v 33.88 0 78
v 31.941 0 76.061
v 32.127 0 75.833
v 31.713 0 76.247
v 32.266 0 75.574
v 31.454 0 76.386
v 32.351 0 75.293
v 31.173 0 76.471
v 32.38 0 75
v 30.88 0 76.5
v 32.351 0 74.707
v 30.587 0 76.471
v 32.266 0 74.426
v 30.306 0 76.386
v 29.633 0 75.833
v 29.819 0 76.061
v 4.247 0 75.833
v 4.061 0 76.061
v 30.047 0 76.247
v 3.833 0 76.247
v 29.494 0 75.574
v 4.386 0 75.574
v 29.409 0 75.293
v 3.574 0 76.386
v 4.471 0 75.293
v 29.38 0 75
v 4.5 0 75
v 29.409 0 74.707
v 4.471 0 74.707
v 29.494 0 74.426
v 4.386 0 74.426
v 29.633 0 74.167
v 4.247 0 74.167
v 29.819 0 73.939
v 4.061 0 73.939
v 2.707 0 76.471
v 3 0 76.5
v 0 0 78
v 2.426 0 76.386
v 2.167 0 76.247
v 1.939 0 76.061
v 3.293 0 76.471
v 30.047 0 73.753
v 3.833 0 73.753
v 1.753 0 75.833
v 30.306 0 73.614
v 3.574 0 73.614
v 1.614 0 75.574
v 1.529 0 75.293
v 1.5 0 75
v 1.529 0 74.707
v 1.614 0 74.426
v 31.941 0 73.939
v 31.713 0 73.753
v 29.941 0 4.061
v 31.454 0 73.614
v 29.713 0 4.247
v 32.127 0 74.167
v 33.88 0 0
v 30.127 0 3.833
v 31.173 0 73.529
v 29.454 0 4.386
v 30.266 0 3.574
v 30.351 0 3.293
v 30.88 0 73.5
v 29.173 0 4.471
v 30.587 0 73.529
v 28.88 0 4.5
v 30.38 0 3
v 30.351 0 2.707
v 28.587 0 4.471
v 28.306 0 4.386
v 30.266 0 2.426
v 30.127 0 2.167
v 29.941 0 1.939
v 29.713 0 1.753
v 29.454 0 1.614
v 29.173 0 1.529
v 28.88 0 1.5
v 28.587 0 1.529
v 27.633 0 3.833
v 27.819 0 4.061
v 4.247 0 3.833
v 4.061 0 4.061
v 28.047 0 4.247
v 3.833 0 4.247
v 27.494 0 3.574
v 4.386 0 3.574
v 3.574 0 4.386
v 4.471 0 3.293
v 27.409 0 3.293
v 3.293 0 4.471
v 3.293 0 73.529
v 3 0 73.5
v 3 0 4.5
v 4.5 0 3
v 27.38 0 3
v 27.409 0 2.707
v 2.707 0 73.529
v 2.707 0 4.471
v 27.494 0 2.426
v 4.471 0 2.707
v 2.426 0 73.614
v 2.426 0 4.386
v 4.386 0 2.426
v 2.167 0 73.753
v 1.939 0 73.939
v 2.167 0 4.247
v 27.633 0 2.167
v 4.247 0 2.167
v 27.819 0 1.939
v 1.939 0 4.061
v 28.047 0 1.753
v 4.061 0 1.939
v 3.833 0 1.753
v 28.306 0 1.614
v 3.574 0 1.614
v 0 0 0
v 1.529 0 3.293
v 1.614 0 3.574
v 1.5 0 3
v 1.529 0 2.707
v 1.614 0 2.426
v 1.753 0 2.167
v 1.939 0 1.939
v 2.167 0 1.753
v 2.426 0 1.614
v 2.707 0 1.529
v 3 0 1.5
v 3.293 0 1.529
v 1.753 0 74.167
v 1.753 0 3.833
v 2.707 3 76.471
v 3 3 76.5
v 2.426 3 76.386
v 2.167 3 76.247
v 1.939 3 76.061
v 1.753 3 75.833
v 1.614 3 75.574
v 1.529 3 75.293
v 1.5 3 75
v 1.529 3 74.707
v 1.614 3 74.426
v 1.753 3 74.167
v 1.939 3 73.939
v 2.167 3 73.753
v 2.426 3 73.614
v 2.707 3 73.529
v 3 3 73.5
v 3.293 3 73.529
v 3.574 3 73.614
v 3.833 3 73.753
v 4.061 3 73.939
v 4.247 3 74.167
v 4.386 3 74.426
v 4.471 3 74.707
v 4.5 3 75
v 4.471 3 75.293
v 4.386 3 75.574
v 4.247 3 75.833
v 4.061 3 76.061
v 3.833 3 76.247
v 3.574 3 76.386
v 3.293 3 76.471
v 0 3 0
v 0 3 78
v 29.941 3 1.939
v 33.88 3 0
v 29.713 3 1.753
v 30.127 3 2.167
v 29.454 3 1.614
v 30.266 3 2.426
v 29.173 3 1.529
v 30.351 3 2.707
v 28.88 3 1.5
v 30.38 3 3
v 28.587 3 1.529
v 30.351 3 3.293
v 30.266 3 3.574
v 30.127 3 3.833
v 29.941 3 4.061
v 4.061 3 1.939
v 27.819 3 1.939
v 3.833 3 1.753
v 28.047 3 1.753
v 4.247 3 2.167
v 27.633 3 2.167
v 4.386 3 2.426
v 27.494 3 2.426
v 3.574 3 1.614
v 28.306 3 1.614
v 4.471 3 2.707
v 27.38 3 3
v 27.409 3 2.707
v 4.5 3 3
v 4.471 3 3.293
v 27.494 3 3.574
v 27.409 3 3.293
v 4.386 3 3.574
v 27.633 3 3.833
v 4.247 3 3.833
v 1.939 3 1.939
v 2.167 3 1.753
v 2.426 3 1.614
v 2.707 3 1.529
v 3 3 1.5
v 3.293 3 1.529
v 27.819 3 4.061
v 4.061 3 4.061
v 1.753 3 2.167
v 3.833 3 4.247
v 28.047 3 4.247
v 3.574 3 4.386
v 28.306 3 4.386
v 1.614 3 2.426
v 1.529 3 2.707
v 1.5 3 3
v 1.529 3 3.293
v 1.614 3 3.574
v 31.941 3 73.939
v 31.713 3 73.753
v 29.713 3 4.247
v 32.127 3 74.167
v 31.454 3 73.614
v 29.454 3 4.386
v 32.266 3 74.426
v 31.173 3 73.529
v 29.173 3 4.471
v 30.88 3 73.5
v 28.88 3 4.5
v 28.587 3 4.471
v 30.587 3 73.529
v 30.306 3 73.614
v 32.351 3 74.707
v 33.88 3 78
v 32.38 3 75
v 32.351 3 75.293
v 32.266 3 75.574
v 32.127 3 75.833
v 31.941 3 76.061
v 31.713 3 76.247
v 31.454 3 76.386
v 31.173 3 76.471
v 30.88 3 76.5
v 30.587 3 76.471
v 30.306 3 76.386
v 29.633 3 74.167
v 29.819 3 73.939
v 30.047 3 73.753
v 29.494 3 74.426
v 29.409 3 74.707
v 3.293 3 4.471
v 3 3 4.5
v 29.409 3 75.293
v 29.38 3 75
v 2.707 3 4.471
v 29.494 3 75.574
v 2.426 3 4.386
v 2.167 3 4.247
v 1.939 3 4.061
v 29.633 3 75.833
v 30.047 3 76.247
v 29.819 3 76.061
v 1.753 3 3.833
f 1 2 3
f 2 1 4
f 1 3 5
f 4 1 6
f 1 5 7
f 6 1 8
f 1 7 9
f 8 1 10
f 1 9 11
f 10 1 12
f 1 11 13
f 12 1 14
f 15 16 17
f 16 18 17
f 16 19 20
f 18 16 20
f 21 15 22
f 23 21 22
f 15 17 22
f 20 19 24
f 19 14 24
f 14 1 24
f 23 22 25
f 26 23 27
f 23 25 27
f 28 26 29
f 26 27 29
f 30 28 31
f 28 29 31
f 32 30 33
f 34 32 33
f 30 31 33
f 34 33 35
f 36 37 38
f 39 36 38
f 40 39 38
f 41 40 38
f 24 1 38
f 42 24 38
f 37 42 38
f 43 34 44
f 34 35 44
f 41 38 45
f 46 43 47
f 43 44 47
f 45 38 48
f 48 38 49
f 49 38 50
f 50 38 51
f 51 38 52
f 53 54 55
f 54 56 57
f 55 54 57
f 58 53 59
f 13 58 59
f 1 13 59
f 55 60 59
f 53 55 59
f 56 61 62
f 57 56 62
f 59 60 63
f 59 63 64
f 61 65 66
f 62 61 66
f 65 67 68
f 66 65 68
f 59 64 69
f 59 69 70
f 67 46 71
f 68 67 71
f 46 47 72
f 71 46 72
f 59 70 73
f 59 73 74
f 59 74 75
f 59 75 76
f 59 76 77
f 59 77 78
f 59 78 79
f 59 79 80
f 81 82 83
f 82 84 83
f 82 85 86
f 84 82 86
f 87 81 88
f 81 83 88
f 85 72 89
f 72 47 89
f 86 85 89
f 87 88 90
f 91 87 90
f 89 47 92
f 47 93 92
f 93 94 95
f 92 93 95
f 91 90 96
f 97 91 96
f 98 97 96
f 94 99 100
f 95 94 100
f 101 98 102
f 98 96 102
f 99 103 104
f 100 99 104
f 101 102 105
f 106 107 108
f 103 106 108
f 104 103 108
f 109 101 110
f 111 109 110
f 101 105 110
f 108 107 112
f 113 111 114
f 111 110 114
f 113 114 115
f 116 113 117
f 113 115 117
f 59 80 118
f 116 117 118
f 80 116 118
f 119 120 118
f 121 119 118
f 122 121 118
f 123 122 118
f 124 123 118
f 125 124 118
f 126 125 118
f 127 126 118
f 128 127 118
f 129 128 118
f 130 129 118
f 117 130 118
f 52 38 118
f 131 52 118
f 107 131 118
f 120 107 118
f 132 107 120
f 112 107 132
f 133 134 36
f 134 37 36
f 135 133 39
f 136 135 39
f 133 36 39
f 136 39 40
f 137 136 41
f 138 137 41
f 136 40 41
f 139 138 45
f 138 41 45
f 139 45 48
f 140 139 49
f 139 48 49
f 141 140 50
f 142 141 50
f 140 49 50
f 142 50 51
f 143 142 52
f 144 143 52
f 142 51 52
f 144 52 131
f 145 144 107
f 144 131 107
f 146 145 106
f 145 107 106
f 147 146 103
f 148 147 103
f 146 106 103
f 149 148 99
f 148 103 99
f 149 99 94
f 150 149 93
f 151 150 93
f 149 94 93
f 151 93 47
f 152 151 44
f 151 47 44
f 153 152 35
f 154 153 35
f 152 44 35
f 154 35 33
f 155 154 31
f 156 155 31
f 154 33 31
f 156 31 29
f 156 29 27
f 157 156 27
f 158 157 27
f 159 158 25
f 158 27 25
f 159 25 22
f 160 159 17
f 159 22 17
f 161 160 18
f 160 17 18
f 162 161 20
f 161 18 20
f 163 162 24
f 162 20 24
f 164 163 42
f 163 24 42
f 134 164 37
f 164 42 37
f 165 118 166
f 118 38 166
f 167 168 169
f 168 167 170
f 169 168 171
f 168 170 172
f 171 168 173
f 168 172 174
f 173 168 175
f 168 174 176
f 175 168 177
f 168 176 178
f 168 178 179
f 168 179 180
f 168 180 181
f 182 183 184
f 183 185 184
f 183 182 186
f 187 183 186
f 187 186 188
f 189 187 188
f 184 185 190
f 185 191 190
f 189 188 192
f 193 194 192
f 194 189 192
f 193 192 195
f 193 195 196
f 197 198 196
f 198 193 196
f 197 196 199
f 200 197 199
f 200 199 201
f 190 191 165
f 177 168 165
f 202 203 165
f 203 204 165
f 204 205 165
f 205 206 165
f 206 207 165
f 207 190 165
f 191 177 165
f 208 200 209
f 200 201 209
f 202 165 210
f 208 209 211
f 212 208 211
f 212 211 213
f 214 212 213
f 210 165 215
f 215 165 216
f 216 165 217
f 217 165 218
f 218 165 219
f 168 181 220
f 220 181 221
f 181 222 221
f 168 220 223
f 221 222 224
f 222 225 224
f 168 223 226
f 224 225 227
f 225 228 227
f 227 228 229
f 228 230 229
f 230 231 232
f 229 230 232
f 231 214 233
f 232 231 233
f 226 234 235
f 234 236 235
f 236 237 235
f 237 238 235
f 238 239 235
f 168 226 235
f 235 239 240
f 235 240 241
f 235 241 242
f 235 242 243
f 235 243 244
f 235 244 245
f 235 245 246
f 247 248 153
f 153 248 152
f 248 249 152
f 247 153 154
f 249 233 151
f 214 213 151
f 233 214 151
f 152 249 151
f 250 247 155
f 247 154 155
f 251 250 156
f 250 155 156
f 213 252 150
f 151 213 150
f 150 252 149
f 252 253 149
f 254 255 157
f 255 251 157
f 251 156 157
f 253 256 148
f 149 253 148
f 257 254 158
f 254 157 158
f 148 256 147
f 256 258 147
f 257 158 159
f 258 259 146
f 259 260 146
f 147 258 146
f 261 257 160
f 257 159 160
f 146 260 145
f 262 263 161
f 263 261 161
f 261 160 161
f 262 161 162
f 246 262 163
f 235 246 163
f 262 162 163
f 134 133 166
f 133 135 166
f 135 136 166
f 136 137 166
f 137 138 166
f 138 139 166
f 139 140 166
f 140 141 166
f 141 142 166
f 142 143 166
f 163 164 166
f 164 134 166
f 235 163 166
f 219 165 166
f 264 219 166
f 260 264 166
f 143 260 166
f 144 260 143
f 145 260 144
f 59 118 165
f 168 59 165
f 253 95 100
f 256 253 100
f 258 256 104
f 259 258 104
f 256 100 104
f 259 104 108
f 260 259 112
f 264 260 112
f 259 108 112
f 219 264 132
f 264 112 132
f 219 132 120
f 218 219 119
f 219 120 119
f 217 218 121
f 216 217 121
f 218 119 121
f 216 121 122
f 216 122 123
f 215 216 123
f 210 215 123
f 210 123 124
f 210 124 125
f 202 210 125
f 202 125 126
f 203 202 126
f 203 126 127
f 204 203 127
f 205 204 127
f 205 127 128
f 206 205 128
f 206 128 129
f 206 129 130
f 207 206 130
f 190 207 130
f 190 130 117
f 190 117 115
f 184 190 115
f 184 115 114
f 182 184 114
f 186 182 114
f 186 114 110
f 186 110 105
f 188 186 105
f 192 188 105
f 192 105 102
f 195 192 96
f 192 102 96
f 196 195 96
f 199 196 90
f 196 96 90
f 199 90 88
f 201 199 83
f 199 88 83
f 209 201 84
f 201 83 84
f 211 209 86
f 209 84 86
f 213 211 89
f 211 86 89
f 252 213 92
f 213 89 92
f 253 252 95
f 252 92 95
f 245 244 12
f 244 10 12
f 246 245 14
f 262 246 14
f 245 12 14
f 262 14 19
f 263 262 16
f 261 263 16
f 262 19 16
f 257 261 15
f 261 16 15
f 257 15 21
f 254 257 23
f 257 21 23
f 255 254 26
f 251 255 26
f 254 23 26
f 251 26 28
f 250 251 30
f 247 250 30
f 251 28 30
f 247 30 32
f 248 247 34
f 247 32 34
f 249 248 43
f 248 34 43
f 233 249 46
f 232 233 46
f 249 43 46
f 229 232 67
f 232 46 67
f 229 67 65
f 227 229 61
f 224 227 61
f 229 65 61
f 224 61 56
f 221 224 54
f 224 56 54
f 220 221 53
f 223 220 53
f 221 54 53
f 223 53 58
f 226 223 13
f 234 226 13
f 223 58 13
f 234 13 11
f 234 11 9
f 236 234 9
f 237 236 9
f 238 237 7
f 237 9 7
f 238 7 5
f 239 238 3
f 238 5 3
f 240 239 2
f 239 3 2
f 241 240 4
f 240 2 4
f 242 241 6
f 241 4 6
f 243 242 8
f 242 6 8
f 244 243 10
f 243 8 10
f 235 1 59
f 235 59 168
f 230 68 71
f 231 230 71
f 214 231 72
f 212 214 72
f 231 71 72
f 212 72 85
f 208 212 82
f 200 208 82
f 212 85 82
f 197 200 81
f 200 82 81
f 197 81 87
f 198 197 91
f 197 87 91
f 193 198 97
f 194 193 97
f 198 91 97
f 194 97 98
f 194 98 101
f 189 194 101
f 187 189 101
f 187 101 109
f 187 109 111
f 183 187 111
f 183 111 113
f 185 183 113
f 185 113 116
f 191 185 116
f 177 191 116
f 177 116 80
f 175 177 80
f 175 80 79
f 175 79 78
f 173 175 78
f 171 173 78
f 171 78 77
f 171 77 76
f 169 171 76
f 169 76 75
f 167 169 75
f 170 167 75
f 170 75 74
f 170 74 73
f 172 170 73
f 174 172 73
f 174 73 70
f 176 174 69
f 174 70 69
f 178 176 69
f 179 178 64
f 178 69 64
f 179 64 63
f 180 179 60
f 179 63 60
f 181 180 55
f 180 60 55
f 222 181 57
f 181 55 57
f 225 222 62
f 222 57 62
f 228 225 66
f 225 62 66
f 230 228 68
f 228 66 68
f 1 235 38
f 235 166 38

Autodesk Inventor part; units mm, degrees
ref_plane "YZ Plane" through (0, 0, 0) normal (1, 0, 0) x (0, 1, 0)
ref_plane "XZ Plane" through (0, 0, 0) normal (0, 1, 0) x (-1, 0, 0)
ref_plane "Plano de trabajo2" through (33.88, 0, 75) normal (-1, 0, 0) x (0, 0, 1)
sketch "Boceto2" plane through (0, 0, 0) normal (1, 0, 0) x (0, 1, 0)
  line L0 (0, 0) -> (3, 0)
  line L1 (3, 0) -> (3, 78)
  line L2 (3, 78) -> (0, 78)
  line L3 (0, 78) -> (0, 0)
  dimension "d4" = 3
  dimension "d5" = 78
extrude "Extrusión2" add sketch "Boceto2" along normal up to surface (33.88 mm away)
sketch "Boceto3" plane through (0, 3, 78) normal (0, 1, 0) x (1, 0, 0)
  circle A0 centre (3, 3) radius 2.1 projected
  circle A1 centre (30.88, 3) radius 2.1 projected
  circle A2 centre (3, 75) radius 2.1 projected
  circle A3 centre (28.88, 75) radius 2.1 projected
  point P0 (0, 78)
hole "Agujero1" at (3, 3, 75) at (30.88, 3, 75) at (3, 3, 3) at (28.88, 3, 3) direction (0, -1, 0) diameter 3 depth 5
properties part number "Lateral trasero"
